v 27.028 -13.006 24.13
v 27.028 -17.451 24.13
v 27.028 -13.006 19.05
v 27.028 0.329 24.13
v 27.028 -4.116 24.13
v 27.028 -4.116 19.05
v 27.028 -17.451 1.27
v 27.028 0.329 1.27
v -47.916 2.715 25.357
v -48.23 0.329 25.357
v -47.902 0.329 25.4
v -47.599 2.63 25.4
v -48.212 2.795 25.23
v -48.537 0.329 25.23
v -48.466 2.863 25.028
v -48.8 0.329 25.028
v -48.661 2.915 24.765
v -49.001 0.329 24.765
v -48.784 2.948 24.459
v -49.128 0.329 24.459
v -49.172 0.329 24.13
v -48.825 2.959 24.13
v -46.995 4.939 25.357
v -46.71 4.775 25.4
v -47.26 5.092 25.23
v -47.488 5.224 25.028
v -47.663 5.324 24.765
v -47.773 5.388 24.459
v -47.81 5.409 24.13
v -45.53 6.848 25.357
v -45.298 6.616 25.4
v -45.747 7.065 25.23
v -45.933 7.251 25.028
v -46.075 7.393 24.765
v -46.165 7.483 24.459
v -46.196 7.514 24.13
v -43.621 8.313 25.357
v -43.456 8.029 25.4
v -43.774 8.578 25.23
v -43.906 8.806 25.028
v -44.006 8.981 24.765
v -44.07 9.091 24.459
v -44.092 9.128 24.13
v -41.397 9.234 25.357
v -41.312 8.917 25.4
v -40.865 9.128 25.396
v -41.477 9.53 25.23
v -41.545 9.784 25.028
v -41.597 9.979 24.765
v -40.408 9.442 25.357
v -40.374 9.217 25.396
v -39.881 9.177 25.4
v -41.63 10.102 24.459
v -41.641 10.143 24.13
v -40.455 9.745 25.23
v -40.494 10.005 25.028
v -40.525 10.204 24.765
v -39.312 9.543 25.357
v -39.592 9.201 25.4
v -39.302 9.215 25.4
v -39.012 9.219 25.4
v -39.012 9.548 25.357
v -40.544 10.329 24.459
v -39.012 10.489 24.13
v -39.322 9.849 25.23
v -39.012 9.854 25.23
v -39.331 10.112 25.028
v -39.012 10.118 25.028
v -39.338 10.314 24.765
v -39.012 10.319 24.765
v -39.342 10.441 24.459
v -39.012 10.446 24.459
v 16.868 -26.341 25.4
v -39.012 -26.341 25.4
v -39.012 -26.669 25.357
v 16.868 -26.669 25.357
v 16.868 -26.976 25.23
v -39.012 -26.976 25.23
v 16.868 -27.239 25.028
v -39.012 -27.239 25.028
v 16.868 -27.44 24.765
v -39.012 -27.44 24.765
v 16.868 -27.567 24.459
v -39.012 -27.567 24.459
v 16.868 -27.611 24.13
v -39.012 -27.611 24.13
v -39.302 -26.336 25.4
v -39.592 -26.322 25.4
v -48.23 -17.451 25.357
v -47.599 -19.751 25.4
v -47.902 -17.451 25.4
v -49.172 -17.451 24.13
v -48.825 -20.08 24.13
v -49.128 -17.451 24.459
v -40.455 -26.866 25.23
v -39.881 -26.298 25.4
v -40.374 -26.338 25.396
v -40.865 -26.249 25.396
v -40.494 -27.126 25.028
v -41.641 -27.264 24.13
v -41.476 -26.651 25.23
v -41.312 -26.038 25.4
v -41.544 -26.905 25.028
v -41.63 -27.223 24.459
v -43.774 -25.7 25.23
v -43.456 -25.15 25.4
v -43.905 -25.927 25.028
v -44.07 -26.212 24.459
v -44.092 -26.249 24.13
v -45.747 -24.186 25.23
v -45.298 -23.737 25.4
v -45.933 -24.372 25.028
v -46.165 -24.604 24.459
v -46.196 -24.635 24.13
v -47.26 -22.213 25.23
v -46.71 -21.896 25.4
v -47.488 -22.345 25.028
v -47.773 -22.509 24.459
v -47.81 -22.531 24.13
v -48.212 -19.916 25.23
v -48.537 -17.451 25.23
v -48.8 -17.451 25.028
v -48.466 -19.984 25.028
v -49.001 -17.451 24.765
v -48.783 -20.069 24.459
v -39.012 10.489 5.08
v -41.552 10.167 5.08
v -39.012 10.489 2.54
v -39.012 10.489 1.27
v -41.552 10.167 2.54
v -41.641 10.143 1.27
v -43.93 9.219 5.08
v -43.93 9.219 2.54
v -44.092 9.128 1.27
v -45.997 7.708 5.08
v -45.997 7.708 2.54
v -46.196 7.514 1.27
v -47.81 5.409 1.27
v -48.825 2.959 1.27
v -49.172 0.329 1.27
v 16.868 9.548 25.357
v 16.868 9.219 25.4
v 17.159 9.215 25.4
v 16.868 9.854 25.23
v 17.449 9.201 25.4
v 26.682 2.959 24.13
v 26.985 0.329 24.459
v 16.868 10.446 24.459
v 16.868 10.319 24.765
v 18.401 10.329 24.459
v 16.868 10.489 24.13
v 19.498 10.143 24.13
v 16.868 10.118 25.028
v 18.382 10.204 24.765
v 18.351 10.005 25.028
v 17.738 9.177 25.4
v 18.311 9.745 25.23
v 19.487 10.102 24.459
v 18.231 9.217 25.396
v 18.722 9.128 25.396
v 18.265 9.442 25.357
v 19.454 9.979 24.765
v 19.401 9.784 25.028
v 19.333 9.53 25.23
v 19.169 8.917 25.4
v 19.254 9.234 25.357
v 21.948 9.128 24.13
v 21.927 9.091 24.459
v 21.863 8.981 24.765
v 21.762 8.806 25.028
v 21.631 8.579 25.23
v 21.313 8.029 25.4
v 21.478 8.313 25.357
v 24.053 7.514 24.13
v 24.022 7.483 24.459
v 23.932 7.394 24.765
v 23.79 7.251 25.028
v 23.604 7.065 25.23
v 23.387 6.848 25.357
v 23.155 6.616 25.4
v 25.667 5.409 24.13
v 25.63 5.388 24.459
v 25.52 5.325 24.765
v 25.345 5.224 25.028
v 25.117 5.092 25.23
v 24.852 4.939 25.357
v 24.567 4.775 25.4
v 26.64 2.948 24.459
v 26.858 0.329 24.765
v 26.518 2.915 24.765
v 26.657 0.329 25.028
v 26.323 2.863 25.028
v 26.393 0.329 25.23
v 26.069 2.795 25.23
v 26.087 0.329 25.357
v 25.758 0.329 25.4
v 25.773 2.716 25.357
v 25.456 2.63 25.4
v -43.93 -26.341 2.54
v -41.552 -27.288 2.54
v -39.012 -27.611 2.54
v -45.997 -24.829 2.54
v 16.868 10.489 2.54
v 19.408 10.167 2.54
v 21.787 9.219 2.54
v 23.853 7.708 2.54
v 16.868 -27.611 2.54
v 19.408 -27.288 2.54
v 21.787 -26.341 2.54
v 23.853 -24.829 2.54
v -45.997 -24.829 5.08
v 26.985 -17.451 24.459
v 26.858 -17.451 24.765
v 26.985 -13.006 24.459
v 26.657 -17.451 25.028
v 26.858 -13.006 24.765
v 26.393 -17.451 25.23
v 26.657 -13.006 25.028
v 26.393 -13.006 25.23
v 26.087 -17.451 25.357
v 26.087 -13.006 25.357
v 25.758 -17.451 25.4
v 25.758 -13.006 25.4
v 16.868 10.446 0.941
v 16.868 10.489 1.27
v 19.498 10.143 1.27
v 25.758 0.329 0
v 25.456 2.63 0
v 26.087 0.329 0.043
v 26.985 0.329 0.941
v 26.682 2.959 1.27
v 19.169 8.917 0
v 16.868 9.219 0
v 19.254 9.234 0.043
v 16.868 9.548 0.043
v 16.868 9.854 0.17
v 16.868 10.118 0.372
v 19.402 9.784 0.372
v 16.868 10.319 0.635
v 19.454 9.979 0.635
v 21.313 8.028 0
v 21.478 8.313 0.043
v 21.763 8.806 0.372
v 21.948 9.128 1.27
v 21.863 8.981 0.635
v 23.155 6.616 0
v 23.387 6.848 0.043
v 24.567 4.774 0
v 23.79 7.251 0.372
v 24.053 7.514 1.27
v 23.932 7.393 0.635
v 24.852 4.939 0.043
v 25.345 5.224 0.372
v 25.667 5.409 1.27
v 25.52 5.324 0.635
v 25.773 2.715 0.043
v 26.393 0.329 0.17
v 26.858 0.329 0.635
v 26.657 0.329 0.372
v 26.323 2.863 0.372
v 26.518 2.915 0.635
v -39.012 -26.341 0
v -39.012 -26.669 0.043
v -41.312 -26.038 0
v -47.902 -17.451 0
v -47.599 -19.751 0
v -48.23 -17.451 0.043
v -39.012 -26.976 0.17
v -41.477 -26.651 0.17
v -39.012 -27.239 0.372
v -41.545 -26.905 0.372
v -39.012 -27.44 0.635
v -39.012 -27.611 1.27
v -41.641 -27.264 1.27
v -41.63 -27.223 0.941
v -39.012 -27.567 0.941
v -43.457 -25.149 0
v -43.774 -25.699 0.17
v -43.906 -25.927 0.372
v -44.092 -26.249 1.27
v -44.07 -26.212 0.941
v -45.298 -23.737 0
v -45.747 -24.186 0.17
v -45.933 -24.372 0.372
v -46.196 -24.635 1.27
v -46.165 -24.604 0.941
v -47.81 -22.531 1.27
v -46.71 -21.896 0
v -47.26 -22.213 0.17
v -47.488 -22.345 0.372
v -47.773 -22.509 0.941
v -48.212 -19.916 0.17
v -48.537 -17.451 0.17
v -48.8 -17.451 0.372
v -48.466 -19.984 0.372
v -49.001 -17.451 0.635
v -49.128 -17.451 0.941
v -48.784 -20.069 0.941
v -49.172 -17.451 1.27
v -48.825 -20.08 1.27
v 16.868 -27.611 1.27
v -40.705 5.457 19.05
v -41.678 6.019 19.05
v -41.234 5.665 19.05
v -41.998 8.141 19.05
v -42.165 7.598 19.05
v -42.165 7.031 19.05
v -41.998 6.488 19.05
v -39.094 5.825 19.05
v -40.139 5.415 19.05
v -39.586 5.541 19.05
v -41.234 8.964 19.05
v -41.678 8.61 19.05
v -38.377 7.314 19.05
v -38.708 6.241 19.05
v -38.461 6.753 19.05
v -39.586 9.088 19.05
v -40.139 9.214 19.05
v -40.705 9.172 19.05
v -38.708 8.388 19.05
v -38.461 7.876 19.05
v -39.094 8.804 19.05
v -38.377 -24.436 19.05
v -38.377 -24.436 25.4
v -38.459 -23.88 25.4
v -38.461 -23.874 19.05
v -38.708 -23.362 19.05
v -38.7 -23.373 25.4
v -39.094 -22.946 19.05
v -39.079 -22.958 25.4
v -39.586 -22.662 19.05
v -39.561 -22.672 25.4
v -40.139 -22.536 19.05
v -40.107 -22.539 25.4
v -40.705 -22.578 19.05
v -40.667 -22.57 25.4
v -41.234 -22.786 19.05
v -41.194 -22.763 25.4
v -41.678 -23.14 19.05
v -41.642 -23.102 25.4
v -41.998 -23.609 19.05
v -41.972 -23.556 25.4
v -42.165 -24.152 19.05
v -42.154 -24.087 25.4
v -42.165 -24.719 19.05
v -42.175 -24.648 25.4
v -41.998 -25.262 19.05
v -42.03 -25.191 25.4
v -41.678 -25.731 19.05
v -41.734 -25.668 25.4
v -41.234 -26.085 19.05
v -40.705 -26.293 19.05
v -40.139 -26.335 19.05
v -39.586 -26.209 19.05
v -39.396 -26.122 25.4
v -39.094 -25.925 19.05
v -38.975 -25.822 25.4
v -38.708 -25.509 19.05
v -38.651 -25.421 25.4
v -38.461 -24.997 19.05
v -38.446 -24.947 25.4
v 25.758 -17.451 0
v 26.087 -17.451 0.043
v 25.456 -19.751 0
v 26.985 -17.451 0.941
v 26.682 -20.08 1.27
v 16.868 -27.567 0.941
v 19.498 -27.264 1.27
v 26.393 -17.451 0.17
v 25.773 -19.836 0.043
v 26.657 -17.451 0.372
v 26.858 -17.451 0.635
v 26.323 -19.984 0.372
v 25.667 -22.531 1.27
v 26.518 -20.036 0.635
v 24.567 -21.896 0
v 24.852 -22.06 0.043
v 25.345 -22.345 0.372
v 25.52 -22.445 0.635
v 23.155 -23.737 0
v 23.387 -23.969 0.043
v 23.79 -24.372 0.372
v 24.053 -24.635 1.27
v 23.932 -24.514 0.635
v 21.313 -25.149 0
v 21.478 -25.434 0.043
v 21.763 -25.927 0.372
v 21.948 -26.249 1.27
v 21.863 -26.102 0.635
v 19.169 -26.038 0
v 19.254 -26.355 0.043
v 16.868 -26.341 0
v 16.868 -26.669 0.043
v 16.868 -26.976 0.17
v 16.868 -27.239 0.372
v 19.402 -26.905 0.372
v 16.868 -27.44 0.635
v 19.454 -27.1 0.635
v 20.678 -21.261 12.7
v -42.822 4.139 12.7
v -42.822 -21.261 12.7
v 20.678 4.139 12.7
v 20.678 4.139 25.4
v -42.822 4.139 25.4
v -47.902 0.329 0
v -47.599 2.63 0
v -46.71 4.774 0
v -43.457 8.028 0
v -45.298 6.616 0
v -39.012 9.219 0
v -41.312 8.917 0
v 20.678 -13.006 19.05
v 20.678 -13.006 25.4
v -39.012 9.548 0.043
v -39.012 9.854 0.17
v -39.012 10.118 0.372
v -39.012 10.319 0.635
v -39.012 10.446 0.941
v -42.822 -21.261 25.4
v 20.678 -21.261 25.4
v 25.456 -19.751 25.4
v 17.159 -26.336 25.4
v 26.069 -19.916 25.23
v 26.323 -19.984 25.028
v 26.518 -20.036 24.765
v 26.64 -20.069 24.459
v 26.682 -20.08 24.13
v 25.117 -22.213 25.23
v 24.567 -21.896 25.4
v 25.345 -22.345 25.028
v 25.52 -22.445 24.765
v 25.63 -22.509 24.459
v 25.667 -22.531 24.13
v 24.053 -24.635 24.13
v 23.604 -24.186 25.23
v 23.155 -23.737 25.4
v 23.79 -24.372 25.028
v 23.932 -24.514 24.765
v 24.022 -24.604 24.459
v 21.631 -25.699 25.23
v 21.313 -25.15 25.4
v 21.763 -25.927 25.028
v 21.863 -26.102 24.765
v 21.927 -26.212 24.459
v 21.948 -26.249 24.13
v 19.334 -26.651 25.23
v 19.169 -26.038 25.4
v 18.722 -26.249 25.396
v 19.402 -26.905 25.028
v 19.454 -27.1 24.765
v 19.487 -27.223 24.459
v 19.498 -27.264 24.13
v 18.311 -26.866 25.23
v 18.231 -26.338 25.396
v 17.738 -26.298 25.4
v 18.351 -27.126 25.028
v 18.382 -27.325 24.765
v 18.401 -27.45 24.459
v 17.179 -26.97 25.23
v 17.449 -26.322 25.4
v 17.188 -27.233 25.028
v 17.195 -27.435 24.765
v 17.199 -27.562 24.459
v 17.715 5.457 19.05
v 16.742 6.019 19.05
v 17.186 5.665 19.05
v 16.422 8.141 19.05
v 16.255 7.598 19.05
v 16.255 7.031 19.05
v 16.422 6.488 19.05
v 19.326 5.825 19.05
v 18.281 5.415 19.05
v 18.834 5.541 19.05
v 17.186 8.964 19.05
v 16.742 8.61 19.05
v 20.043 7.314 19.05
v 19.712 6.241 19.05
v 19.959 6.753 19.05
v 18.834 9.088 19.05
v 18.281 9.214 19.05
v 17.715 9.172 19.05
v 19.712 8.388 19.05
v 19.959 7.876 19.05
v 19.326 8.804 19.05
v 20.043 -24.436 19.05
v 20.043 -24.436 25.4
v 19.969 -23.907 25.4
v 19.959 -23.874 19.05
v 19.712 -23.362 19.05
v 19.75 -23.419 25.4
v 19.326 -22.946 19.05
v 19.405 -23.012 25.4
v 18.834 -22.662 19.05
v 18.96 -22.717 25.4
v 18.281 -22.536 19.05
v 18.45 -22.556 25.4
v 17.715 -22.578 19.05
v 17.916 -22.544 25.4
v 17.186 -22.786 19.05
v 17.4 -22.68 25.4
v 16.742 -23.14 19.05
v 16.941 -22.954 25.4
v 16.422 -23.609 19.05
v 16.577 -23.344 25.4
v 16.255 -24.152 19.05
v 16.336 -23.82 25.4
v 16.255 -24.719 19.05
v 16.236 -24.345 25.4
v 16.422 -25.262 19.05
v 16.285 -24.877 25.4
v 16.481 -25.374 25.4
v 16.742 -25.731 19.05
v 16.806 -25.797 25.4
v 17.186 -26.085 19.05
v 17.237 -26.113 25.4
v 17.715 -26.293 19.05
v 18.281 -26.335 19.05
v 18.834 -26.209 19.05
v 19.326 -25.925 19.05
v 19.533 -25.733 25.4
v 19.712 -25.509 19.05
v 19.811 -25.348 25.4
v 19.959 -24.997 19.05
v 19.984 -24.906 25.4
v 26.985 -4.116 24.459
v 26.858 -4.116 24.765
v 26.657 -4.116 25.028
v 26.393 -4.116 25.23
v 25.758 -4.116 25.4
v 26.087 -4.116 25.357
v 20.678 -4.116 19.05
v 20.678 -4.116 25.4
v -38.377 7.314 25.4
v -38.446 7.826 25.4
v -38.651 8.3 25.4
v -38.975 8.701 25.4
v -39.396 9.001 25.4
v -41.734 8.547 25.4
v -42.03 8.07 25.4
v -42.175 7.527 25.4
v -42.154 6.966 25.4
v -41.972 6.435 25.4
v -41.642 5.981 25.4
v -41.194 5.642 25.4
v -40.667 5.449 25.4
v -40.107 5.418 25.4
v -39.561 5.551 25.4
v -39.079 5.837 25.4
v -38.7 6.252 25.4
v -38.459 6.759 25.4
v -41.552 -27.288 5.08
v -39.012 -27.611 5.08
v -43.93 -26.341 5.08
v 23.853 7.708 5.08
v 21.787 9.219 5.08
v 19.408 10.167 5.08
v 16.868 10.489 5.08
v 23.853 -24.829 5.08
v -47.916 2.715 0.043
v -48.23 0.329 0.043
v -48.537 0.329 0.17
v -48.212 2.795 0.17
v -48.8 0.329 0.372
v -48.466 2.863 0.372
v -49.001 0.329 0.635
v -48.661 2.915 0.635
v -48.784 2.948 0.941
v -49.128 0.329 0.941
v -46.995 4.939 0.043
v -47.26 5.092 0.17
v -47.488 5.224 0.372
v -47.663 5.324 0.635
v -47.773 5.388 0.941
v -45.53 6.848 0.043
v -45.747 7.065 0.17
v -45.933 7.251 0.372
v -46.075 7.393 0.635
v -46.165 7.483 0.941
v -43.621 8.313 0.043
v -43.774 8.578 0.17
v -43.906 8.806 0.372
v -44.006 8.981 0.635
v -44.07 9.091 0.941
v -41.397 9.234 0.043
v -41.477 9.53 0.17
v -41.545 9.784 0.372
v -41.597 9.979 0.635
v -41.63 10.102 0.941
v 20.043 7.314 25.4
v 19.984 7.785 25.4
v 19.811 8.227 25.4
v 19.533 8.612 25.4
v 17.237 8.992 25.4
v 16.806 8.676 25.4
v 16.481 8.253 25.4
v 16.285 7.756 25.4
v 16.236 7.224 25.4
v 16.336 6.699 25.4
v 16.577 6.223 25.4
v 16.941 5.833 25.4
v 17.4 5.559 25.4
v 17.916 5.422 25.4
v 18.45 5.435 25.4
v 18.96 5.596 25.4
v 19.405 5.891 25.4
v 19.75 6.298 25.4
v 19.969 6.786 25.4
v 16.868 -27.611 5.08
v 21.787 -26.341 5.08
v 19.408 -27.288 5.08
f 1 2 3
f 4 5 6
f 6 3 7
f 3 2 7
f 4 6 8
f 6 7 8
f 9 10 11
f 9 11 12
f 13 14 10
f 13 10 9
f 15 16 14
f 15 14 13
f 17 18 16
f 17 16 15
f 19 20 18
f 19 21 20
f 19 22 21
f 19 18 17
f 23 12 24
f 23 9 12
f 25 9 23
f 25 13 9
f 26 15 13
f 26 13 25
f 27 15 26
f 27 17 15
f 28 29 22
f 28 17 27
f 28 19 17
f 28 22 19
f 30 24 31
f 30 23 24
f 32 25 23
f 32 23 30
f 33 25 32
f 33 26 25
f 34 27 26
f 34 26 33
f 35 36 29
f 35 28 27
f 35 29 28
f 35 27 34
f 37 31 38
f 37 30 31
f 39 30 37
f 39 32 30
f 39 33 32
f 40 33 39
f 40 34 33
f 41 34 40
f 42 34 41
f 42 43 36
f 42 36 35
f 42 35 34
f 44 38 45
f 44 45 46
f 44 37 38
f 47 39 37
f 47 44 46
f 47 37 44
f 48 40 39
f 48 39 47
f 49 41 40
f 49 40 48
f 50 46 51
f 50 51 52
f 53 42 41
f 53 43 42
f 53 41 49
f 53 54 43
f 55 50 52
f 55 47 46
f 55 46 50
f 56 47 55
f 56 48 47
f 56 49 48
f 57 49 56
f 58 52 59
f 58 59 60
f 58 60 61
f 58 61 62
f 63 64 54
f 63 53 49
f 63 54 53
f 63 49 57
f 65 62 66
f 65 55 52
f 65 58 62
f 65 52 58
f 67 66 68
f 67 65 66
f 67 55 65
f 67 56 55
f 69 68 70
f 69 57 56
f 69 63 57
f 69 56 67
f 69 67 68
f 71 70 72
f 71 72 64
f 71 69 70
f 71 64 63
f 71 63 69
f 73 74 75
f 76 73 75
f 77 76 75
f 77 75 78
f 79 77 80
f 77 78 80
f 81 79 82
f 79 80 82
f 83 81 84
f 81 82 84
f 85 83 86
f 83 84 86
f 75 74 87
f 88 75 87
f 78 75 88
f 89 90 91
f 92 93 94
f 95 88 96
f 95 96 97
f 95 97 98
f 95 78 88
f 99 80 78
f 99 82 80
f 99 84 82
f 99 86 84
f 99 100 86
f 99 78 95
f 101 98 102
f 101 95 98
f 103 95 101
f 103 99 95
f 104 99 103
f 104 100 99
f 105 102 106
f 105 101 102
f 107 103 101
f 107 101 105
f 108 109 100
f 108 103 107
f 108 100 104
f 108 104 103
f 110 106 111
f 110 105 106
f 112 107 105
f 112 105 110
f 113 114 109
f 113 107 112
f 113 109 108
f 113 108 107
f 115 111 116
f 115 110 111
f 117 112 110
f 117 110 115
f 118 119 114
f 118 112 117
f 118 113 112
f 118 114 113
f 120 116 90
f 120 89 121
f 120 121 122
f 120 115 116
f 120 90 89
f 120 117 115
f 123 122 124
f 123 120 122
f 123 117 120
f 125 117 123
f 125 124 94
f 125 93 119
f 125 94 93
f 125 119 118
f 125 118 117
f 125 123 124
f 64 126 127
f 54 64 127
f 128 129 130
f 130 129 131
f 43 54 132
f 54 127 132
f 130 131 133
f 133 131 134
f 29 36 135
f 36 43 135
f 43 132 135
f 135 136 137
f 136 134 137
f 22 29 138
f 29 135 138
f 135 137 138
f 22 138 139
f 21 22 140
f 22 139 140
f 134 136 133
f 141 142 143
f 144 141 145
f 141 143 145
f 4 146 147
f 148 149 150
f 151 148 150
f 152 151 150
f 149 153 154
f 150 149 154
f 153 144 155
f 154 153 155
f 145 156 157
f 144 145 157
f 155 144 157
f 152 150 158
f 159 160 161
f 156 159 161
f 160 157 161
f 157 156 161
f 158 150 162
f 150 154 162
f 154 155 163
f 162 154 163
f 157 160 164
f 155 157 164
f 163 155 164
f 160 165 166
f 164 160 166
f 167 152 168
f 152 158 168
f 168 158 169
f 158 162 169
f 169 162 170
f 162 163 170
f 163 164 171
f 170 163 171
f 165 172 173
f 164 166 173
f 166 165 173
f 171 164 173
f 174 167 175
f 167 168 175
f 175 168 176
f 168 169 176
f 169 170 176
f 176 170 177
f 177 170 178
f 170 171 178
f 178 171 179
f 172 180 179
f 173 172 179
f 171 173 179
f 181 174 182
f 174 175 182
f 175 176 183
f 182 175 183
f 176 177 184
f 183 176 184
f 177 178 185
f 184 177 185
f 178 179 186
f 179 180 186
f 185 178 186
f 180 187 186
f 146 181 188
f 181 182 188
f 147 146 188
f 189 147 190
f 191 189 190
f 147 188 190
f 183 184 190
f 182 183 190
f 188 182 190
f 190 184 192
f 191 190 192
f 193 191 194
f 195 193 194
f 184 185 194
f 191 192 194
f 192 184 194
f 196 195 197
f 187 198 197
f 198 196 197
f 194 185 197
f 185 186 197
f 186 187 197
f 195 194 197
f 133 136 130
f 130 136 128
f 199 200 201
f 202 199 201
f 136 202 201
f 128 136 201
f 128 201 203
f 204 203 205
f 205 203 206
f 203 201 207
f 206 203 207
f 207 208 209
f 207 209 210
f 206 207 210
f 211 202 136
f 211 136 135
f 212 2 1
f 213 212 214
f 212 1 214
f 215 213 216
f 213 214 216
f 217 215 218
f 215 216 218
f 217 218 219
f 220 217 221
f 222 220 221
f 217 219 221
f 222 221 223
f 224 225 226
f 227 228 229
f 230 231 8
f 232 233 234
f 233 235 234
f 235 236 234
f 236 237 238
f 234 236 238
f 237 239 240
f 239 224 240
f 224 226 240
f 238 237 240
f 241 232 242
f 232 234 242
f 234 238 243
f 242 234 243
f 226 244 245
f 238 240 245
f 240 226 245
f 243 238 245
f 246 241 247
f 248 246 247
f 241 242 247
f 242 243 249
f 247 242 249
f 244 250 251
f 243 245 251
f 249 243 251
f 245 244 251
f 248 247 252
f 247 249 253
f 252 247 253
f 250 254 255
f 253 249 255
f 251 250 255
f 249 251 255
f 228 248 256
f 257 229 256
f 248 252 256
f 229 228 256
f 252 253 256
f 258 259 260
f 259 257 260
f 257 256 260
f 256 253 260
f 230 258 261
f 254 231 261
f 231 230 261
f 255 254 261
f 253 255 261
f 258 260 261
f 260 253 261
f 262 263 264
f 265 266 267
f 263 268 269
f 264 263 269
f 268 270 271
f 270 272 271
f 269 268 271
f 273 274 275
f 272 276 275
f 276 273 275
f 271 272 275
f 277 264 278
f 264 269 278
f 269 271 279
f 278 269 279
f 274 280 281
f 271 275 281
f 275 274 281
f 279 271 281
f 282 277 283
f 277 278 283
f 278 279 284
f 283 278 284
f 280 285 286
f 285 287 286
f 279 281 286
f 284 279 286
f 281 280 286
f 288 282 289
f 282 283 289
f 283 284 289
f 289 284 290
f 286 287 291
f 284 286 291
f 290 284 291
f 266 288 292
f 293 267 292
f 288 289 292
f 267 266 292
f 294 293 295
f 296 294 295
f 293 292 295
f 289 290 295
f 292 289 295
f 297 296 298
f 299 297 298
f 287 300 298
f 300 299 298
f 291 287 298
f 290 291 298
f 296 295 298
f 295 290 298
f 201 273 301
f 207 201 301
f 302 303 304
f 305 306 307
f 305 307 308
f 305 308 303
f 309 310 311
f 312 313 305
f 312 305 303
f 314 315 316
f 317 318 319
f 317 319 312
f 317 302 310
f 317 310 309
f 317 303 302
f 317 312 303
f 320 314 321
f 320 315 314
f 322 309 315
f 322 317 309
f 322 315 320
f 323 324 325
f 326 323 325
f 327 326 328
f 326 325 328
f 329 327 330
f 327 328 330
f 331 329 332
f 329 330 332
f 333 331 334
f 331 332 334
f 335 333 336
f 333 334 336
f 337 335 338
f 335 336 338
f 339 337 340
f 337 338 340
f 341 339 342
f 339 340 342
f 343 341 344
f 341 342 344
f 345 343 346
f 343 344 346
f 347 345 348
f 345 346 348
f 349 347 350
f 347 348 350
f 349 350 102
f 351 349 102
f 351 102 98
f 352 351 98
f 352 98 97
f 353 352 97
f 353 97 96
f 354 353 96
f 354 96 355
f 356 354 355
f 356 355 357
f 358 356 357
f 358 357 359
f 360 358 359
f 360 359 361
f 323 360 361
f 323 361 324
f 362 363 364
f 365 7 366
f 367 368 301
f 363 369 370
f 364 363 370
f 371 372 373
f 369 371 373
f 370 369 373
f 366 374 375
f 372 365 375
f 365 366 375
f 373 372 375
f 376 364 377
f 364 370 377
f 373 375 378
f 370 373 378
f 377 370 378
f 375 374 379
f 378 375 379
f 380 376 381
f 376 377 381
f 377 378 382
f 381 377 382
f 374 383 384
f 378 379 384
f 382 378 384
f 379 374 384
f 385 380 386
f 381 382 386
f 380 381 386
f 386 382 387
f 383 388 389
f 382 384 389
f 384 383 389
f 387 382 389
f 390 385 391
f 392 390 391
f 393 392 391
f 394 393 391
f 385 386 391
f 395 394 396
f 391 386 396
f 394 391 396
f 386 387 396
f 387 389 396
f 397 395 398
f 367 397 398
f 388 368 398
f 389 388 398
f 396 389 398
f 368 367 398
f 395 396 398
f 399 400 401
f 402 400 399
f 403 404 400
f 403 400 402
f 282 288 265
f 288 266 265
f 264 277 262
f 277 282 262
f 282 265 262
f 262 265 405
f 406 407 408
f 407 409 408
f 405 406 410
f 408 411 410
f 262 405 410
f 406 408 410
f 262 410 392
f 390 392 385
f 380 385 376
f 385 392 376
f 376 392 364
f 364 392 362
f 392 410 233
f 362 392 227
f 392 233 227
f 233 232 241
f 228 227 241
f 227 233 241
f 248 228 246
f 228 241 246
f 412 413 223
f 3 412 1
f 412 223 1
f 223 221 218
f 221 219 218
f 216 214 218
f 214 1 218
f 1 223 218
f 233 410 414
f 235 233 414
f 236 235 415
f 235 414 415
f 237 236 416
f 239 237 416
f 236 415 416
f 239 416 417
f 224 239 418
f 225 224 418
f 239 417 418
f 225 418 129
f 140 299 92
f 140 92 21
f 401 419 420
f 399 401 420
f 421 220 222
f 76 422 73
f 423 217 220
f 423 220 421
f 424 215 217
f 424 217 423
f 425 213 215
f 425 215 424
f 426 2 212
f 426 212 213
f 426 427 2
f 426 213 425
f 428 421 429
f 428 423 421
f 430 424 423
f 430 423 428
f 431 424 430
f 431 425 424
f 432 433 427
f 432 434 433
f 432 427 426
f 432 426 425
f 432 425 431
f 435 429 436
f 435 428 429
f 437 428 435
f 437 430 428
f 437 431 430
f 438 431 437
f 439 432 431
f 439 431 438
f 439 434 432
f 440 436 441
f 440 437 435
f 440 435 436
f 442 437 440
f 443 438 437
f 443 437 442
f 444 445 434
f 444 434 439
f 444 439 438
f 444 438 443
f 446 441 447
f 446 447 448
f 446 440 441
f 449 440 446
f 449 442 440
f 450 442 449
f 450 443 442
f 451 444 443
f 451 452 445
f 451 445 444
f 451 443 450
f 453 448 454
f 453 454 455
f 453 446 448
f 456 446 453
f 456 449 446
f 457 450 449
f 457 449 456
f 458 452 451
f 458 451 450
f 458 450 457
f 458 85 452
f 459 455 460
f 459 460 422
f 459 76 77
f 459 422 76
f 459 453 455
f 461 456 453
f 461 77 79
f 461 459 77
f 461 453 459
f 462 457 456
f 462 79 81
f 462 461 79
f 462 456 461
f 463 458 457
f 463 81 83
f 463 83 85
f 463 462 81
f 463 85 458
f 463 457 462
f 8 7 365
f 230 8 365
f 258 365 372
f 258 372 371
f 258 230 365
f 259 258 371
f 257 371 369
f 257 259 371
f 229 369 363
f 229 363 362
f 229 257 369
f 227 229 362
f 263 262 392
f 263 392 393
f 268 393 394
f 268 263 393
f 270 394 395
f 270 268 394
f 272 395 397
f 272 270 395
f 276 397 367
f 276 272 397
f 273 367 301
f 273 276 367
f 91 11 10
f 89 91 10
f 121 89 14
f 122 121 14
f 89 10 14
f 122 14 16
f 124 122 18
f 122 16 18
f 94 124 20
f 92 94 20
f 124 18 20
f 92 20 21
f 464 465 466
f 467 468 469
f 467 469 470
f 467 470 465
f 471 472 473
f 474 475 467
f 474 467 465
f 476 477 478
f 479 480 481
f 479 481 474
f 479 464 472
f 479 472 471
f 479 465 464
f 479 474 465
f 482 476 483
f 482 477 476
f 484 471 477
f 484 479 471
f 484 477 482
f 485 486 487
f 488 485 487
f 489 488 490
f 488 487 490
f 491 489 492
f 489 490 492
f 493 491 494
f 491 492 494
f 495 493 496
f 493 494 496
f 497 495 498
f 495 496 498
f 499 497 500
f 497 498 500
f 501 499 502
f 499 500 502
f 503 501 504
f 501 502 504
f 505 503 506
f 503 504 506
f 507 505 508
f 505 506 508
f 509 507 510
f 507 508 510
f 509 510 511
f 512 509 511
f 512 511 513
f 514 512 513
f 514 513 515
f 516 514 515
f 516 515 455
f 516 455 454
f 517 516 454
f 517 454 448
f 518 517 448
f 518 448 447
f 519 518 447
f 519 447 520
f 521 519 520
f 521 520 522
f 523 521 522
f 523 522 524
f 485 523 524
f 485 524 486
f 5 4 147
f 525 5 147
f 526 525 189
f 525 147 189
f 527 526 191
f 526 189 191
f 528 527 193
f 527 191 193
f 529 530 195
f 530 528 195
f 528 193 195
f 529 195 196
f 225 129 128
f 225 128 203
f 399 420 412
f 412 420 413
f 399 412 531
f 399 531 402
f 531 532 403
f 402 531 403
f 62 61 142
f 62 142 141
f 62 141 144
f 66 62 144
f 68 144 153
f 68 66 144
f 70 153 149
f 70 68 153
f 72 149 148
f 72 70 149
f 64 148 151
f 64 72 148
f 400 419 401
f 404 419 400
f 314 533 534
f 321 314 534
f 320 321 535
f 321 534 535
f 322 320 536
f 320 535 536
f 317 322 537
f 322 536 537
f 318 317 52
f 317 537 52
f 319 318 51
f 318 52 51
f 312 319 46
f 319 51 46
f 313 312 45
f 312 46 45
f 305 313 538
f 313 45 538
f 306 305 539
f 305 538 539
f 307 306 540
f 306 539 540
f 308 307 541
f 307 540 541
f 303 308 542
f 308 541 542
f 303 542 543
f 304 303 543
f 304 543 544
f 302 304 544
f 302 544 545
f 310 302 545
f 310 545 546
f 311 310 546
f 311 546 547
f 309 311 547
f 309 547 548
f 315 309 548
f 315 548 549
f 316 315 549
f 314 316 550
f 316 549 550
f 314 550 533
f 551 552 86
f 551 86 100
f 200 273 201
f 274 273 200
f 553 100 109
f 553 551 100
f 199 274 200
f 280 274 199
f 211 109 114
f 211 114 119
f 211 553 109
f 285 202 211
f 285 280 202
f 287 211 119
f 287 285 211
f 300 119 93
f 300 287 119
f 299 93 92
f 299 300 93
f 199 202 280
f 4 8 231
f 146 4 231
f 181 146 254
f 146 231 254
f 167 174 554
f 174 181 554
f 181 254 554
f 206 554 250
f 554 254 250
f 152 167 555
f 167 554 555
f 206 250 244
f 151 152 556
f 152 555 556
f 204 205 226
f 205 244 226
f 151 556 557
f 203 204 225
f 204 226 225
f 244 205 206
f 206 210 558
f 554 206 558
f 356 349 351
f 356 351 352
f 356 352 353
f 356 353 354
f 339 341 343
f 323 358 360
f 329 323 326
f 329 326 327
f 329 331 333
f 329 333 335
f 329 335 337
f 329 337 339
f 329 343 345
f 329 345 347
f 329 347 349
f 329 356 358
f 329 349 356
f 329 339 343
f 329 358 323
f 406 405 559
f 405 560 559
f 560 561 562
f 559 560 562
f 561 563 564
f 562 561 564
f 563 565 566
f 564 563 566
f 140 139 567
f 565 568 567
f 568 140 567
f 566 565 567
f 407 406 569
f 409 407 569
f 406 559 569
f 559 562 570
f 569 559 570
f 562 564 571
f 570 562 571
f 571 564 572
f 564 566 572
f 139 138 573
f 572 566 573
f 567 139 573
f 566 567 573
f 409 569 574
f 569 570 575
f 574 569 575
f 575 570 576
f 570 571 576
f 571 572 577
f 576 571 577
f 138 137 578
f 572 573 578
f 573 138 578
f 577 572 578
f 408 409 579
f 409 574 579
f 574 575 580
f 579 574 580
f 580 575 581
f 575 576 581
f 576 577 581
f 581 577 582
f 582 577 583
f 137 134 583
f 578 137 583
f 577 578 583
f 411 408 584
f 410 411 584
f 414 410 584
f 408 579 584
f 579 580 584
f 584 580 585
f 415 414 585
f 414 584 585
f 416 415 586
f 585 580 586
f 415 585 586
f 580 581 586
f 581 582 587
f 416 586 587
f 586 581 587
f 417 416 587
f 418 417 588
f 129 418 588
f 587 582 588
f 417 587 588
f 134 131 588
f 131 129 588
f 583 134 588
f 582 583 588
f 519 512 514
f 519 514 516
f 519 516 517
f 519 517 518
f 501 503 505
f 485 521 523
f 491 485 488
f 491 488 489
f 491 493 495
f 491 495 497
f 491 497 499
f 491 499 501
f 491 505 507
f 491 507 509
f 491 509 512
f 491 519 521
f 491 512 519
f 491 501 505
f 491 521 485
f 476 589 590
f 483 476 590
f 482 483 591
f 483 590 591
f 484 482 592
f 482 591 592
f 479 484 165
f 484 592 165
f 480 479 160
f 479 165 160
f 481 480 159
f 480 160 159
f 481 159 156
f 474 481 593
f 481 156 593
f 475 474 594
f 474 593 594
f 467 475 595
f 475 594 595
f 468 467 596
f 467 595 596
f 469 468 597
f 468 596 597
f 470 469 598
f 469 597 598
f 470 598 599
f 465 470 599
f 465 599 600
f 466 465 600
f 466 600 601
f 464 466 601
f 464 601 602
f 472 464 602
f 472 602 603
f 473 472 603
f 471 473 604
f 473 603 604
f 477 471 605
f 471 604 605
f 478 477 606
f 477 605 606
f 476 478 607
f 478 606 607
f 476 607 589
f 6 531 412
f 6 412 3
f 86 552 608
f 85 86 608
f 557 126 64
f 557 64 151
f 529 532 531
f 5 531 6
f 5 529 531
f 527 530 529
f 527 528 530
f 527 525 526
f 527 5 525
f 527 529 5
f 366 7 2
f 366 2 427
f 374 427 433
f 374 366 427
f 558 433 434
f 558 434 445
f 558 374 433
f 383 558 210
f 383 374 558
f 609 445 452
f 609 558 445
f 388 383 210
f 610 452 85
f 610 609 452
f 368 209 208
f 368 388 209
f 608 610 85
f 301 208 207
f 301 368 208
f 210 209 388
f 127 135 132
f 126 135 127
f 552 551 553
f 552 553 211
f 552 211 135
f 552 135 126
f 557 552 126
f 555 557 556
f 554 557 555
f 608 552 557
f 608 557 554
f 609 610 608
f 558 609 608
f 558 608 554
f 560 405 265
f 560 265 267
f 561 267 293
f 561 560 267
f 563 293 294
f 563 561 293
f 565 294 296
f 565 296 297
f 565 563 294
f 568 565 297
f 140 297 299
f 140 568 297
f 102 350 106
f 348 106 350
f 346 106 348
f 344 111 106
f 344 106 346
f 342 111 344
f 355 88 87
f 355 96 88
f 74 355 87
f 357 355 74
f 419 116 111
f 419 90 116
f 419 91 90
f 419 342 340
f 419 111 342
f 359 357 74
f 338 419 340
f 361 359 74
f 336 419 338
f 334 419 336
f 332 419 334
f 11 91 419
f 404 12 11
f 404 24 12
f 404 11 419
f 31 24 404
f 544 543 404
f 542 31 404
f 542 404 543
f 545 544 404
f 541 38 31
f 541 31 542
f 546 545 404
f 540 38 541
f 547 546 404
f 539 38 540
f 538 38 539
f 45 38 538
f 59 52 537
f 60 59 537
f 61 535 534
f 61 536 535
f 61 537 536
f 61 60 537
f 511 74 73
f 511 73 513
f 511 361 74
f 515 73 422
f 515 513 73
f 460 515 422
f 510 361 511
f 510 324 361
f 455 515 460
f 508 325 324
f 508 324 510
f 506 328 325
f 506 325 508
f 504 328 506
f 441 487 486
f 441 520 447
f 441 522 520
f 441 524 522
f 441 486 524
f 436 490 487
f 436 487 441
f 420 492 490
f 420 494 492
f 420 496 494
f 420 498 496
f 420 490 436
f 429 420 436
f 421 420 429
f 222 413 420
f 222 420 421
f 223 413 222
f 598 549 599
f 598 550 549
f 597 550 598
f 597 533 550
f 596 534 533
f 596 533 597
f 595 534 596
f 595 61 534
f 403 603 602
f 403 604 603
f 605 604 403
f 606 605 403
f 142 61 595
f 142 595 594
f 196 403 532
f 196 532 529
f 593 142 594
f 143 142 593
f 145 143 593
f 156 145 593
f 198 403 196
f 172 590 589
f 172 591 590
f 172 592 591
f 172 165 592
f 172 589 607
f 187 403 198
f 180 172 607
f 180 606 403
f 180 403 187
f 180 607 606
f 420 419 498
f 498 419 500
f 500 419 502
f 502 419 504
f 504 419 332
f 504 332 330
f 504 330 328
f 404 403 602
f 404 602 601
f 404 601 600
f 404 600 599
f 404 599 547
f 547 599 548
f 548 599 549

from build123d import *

# Parameters (mm, degrees)
F0_W          = 76.2
F0_H          = 38.1
F1_DEPTH      = 25.4
F2_W          = 69.85
F2_H          = 2.54
F3_DEPTH      = 38.101
F4_W          = 63.5
F4_H          = 25.4
F5_DEPTH      = 12.7
F6_W          = 6.35
F6_H          = 8.89
F7_DEPTH      = 6.35
F8_R          = 1.905
F9_DEPTH      = 6.35
F10_T1_DEPTH  = 76.2
F11_T1_DEPTH  = 17.78
F11_T3_DEPTH  = 55.88
F11_T5_DEPTH  = 7.62
F11_T7_DEPTH  = 7.62
F11_T10_ANGLE = 90.0000000017
F11_T12_ANGLE = 89.9999999998
F11_T14_ANGLE = 89.9999999979
F11_T16_ANGLE = 89.9999999998
F11_T18_ANGLE = 89.9999999998
F11_T20_ANGLE = 89.9999999998
F11_T22_ANGLE = 89.9999999979
F11_T24_ANGLE = 90.0000000017


# Not quite as in the source:
# - a fillet or chamfer that OpenCascade refuses, or shapes differently, is made with other operations: its cross-section is extruded or revolved along the edge and cut away or added


with BuildPart() as f1:
    # F0 (on Top) → F1 (new body)
    with BuildSketch(Plane.XY):
        with Locations((-11.0715073586, -8.5605031371)):
            Rectangle(F0_W, F0_H)
    extrude(amount=F1_DEPTH)

    # F2 (on face) → F3 (cut, through all)
    with BuildSketch(Plane.XZ.offset(27.6105031371)):
        with Locations((-11.0715073586, 3.81)):
            Rectangle(F2_W, F2_H)
    extrude(amount=-F3_DEPTH, mode=Mode.SUBTRACT)

    # F4 (on face) → F5 (cut)
    with BuildSketch(Plane.XY.offset(25.4)):
        with Locations((-11.0715073586, -8.5605031371)):
            Rectangle(F4_W, F4_H)
    extrude(amount=-F5_DEPTH, mode=Mode.SUBTRACT)

    # F6 (on face) → F7 (cut)
    with BuildSketch(Plane.XY.offset(25.4)):
        with Locations((23.8534926414, -8.5605031371)):
            Rectangle(F6_W, F6_H)
    extrude(amount=-F7_DEPTH, mode=Mode.SUBTRACT)

    # F8 (on face) → F9 (cut)
    with BuildSketch(Plane.XY.offset(25.4)):
        with Locations((-40.2815073586, 7.3144968629)):
            Circle(F8_R)
        with Locations((18.1384926414, 7.3144968629)):
            Circle(F8_R)
        with Locations((-40.2815073586, -24.4355031371)):
            Circle(F8_R)
        with Locations((18.1384926414, -24.4355031371)):
            Circle(F8_R)
    extrude(amount=-F9_DEPTH, mode=Mode.SUBTRACT)

    # F10: fillet of radius 10.16 on 4 edges, made by hand

    # F10_s2 → F10_t1 (cut)
    with BuildSketch(Plane.XY.offset(-25.4)):
        with BuildLine():
            ThreePointArc((-39.0115073586, -27.6105031371), (-46.1957122554, -24.634708034), (-49.1715073586, -17.4505031371))
            Line((-49.1715073586, -17.4505031371), (-49.1715073586, -27.6105031371))
            Line((-49.1715073586, -27.6105031371), (-39.0115073586, -27.6105031371))
        make_face()
        with BuildLine():
            ThreePointArc((27.0284926414, -17.4505031371), (24.0526975383, -24.634708034), (16.8684926414, -27.6105031371))
            Line((16.8684926414, -27.6105031371), (27.0284926414, -27.6105031371))
            Line((27.0284926414, -27.6105031371), (27.0284926414, -17.4505031371))
        make_face()
        with BuildLine():
            ThreePointArc((27.0284926414, 0.3294968629), (24.0526975383, 7.5137017597), (16.8684926414, 10.4894968629))
            Line((16.8684926414, 10.4894968629), (27.0284926414, 10.4894968629))
            Line((27.0284926414, 10.4894968629), (27.0284926414, 0.3294968629))
        make_face()
        with BuildLine():
            ThreePointArc((-39.0115073586, 10.4894968629), (-46.1957122554, 7.5137017597), (-49.1715073586, 0.3294968629))
            Line((-49.1715073586, 0.3294968629), (-49.1715073586, 10.4894968629))
            Line((-49.1715073586, 10.4894968629), (-39.0115073586, 10.4894968629))
        make_face()
    extrude(amount=F10_T1_DEPTH, mode=Mode.SUBTRACT)

    # F11: fillet of radius 1.27 on 17 edges, made by hand

    # F11_s2 → F11_t1 (cut)
    with BuildSketch(Plane.XZ.offset(-0.3294968629)):
        with BuildLine():
            ThreePointArc((-47.9015073586, 25.4), (-48.7995329707, 25.0280256121), (-49.1715073586, 24.13))
            Line((-49.1715073586, 24.13), (-49.1715073586, 25.4))
            Line((-49.1715073586, 25.4), (-47.9015073586, 25.4))
        make_face()
        with BuildLine():
            ThreePointArc((27.0284926414, 1.27), (26.6565182536, 0.3719743879), (25.7584926414, 0))
            Line((25.7584926414, 0), (27.0284926414, 0))
            Line((27.0284926414, 0), (27.0284926414, 1.27))
        make_face()
        with BuildLine():
            ThreePointArc((-47.9015073586, 0), (-48.7995329707, 0.3719743879), (-49.1715073586, 1.27))
            Line((-49.1715073586, 1.27), (-49.1715073586, 0))
            Line((-49.1715073586, 0), (-47.9015073586, 0))
        make_face()
    extrude(amount=F11_T1_DEPTH, mode=Mode.SUBTRACT)

    # F11_s4 → F11_t3 (cut)
    with BuildSketch(Plane.YZ.offset(-39.0115073586)):
        with BuildLine():
            ThreePointArc((9.2194968629, 0), (10.117522475, 0.3719743879), (10.4894968629, 1.27))
            Line((10.4894968629, 1.27), (10.4894968629, 0))
            Line((10.4894968629, 0), (9.2194968629, 0))
        make_face()
        with BuildLine():
            ThreePointArc((-26.3405031371, 0), (-27.2385287492, 0.3719743879), (-27.6105031371, 1.27))
            Line((-27.6105031371, 1.27), (-27.6105031371, 0))
            Line((-27.6105031371, 0), (-26.3405031371, 0))
        make_face()
        with BuildLine():
            ThreePointArc((9.2194968629, 25.4), (10.117522475, 25.0280256121), (10.4894968629, 24.13))
            Line((10.4894968629, 24.13), (10.4894968629, 25.4))
            Line((10.4894968629, 25.4), (9.2194968629, 25.4))
        make_face()
        with BuildLine():
            ThreePointArc((-26.3405031371, 25.4), (-27.2385287492, 25.0280256121), (-27.6105031371, 24.13))
            Line((-27.6105031371, 24.13), (-27.6105031371, 25.4))
            Line((-27.6105031371, 25.4), (-26.3405031371, 25.4))
        make_face()
    extrude(amount=F11_T3_DEPTH, mode=Mode.SUBTRACT)

    # F11_s6 → F11_t5 (cut)
    with BuildSketch(Plane.XZ.offset(-0.3294968629)):
        with BuildLine():
            ThreePointArc((27.0284926414, 24.13), (26.6565182536, 25.0280256121), (25.7584926414, 25.4))
            Line((25.7584926414, 25.4), (27.0284926414, 25.4))
            Line((27.0284926414, 25.4), (27.0284926414, 24.13))
        make_face()
    extrude(amount=F11_T5_DEPTH, mode=Mode.SUBTRACT)

    # F11_s8 → F11_t7 (cut)
    with BuildSketch(Plane.XZ.offset(9.8305031371)):
        with BuildLine():
            ThreePointArc((27.0284926414, 24.13), (26.6565182536, 25.0280256121), (25.7584926414, 25.4))
            Line((25.7584926414, 25.4), (27.0284926414, 25.4))
            Line((27.0284926414, 25.4), (27.0284926414, 24.13))
        make_face()
    extrude(amount=F11_T7_DEPTH, mode=Mode.SUBTRACT)

    # F11_s9 → F11_t10 (revolve, cut)
    with BuildSketch(Plane.XZ.offset(17.4505031373)):
        with BuildLine():
            ThreePointArc((25.7584926414, 0), (26.6565182535, 0.3719743879), (27.0284926414, 1.27))
            Line((27.0284926414, 1.27), (27.0284926414, 0))
            Line((27.0284926414, 0), (25.7584926414, 0))
        make_face()
    revolve(axis=Axis((16.8684926416, -17.4505031373, 0), (0, 0, -1)), revolution_arc=F11_T10_ANGLE, mode=Mode.SUBTRACT)

    # F11_s11 → F11_t12 (revolve, cut)
    with BuildSketch(Plane.YZ.offset(-39.0115073586)):
        with BuildLine():
            ThreePointArc((-26.3405031371, 0), (-27.2385287492, 0.3719743879), (-27.6105031371, 1.27))
            Line((-27.6105031371, 1.27), (-27.6105031371, 0))
            Line((-27.6105031371, 0), (-26.3405031371, 0))
        make_face()
    revolve(axis=Axis((-39.0115073586, -17.4505031371, 0), (0, 0, -1)), revolution_arc=F11_T12_ANGLE, mode=Mode.SUBTRACT)

    # F11_s13 → F11_t14 (revolve, cut)
    with BuildSketch(Plane.XZ.offset(-0.3294968627)):
        with BuildLine():
            ThreePointArc((-47.9015073586, 0), (-48.7995329707, 0.3719743879), (-49.1715073586, 1.27))
            Line((-49.1715073586, 1.27), (-49.1715073586, 0))
            Line((-49.1715073586, 0), (-47.9015073586, 0))
        make_face()
    revolve(axis=Axis((-39.0115073584, 0.3294968627, 0), (0, 0, -1)), revolution_arc=F11_T14_ANGLE, mode=Mode.SUBTRACT)

    # F11_s15 → F11_t16 (revolve, cut)
    with BuildSketch(Plane.YZ.offset(16.8684926414)):
        with BuildLine():
            ThreePointArc((9.2194968629, 0), (10.117522475, 0.3719743879), (10.4894968629, 1.27))
            Line((10.4894968629, 1.27), (10.4894968629, 0))
            Line((10.4894968629, 0), (9.2194968629, 0))
        make_face()
    revolve(axis=Axis((16.8684926414, 0.3294968629, 0), (0, 0, -1)), revolution_arc=F11_T16_ANGLE, mode=Mode.SUBTRACT)

    # F11_s17 → F11_t18 (revolve, cut)
    with BuildSketch(Plane.YZ.offset(16.8684926414)):
        with BuildLine():
            ThreePointArc((10.4894968629, 24.13), (10.117522475, 25.0280256121), (9.2194968629, 25.4))
            Line((9.2194968629, 25.4), (10.4894968629, 25.4))
            Line((10.4894968629, 25.4), (10.4894968629, 24.13))
        make_face()
    revolve(axis=Axis((16.8684926414, 0.3294968629, 25.4), (0, 0, -1)), revolution_arc=F11_T18_ANGLE, mode=Mode.SUBTRACT)

    # F11_s19 → F11_t20 (revolve, cut)
    with BuildSketch(Plane.YZ.offset(-39.0115073586)):
        with BuildLine():
            ThreePointArc((-26.3405031371, 25.4), (-27.2385287492, 25.0280256121), (-27.6105031371, 24.13))
            Line((-27.6105031371, 24.13), (-27.6105031371, 25.4))
            Line((-27.6105031371, 25.4), (-26.3405031371, 25.4))
        make_face()
    revolve(axis=Axis((-39.0115073586, -17.4505031371, 25.4), (0, 0, -1)), revolution_arc=F11_T20_ANGLE, mode=Mode.SUBTRACT)

    # F11_s21 → F11_t22 (revolve, cut)
    with BuildSketch(Plane.XZ.offset(-0.3294968627)):
        with BuildLine():
            ThreePointArc((-47.9015073586, 25.4), (-48.7995329707, 25.0280256121), (-49.1715073586, 24.13))
            Line((-49.1715073586, 24.13), (-49.1715073586, 25.4))
            Line((-49.1715073586, 25.4), (-47.9015073586, 25.4))
        make_face()
    revolve(axis=Axis((-39.0115073584, 0.3294968627, 25.4), (0, 0, -1)), revolution_arc=F11_T22_ANGLE, mode=Mode.SUBTRACT)

    # F11_s23 → F11_t24 (revolve, cut)
    with BuildSketch(Plane.XZ.offset(17.4505031373)):
        with BuildLine():
            ThreePointArc((25.7584926414, 25.4), (26.6565182535, 25.0280256121), (27.0284926414, 24.13))
            Line((27.0284926414, 24.13), (27.0284926414, 25.4))
            Line((27.0284926414, 25.4), (25.7584926414, 25.4))
        make_face()
    revolve(axis=Axis((16.8684926416, -17.4505031373, 25.4), (0, 0, -1)), revolution_arc=F11_T24_ANGLE, mode=Mode.SUBTRACT)


solid = f1.part
